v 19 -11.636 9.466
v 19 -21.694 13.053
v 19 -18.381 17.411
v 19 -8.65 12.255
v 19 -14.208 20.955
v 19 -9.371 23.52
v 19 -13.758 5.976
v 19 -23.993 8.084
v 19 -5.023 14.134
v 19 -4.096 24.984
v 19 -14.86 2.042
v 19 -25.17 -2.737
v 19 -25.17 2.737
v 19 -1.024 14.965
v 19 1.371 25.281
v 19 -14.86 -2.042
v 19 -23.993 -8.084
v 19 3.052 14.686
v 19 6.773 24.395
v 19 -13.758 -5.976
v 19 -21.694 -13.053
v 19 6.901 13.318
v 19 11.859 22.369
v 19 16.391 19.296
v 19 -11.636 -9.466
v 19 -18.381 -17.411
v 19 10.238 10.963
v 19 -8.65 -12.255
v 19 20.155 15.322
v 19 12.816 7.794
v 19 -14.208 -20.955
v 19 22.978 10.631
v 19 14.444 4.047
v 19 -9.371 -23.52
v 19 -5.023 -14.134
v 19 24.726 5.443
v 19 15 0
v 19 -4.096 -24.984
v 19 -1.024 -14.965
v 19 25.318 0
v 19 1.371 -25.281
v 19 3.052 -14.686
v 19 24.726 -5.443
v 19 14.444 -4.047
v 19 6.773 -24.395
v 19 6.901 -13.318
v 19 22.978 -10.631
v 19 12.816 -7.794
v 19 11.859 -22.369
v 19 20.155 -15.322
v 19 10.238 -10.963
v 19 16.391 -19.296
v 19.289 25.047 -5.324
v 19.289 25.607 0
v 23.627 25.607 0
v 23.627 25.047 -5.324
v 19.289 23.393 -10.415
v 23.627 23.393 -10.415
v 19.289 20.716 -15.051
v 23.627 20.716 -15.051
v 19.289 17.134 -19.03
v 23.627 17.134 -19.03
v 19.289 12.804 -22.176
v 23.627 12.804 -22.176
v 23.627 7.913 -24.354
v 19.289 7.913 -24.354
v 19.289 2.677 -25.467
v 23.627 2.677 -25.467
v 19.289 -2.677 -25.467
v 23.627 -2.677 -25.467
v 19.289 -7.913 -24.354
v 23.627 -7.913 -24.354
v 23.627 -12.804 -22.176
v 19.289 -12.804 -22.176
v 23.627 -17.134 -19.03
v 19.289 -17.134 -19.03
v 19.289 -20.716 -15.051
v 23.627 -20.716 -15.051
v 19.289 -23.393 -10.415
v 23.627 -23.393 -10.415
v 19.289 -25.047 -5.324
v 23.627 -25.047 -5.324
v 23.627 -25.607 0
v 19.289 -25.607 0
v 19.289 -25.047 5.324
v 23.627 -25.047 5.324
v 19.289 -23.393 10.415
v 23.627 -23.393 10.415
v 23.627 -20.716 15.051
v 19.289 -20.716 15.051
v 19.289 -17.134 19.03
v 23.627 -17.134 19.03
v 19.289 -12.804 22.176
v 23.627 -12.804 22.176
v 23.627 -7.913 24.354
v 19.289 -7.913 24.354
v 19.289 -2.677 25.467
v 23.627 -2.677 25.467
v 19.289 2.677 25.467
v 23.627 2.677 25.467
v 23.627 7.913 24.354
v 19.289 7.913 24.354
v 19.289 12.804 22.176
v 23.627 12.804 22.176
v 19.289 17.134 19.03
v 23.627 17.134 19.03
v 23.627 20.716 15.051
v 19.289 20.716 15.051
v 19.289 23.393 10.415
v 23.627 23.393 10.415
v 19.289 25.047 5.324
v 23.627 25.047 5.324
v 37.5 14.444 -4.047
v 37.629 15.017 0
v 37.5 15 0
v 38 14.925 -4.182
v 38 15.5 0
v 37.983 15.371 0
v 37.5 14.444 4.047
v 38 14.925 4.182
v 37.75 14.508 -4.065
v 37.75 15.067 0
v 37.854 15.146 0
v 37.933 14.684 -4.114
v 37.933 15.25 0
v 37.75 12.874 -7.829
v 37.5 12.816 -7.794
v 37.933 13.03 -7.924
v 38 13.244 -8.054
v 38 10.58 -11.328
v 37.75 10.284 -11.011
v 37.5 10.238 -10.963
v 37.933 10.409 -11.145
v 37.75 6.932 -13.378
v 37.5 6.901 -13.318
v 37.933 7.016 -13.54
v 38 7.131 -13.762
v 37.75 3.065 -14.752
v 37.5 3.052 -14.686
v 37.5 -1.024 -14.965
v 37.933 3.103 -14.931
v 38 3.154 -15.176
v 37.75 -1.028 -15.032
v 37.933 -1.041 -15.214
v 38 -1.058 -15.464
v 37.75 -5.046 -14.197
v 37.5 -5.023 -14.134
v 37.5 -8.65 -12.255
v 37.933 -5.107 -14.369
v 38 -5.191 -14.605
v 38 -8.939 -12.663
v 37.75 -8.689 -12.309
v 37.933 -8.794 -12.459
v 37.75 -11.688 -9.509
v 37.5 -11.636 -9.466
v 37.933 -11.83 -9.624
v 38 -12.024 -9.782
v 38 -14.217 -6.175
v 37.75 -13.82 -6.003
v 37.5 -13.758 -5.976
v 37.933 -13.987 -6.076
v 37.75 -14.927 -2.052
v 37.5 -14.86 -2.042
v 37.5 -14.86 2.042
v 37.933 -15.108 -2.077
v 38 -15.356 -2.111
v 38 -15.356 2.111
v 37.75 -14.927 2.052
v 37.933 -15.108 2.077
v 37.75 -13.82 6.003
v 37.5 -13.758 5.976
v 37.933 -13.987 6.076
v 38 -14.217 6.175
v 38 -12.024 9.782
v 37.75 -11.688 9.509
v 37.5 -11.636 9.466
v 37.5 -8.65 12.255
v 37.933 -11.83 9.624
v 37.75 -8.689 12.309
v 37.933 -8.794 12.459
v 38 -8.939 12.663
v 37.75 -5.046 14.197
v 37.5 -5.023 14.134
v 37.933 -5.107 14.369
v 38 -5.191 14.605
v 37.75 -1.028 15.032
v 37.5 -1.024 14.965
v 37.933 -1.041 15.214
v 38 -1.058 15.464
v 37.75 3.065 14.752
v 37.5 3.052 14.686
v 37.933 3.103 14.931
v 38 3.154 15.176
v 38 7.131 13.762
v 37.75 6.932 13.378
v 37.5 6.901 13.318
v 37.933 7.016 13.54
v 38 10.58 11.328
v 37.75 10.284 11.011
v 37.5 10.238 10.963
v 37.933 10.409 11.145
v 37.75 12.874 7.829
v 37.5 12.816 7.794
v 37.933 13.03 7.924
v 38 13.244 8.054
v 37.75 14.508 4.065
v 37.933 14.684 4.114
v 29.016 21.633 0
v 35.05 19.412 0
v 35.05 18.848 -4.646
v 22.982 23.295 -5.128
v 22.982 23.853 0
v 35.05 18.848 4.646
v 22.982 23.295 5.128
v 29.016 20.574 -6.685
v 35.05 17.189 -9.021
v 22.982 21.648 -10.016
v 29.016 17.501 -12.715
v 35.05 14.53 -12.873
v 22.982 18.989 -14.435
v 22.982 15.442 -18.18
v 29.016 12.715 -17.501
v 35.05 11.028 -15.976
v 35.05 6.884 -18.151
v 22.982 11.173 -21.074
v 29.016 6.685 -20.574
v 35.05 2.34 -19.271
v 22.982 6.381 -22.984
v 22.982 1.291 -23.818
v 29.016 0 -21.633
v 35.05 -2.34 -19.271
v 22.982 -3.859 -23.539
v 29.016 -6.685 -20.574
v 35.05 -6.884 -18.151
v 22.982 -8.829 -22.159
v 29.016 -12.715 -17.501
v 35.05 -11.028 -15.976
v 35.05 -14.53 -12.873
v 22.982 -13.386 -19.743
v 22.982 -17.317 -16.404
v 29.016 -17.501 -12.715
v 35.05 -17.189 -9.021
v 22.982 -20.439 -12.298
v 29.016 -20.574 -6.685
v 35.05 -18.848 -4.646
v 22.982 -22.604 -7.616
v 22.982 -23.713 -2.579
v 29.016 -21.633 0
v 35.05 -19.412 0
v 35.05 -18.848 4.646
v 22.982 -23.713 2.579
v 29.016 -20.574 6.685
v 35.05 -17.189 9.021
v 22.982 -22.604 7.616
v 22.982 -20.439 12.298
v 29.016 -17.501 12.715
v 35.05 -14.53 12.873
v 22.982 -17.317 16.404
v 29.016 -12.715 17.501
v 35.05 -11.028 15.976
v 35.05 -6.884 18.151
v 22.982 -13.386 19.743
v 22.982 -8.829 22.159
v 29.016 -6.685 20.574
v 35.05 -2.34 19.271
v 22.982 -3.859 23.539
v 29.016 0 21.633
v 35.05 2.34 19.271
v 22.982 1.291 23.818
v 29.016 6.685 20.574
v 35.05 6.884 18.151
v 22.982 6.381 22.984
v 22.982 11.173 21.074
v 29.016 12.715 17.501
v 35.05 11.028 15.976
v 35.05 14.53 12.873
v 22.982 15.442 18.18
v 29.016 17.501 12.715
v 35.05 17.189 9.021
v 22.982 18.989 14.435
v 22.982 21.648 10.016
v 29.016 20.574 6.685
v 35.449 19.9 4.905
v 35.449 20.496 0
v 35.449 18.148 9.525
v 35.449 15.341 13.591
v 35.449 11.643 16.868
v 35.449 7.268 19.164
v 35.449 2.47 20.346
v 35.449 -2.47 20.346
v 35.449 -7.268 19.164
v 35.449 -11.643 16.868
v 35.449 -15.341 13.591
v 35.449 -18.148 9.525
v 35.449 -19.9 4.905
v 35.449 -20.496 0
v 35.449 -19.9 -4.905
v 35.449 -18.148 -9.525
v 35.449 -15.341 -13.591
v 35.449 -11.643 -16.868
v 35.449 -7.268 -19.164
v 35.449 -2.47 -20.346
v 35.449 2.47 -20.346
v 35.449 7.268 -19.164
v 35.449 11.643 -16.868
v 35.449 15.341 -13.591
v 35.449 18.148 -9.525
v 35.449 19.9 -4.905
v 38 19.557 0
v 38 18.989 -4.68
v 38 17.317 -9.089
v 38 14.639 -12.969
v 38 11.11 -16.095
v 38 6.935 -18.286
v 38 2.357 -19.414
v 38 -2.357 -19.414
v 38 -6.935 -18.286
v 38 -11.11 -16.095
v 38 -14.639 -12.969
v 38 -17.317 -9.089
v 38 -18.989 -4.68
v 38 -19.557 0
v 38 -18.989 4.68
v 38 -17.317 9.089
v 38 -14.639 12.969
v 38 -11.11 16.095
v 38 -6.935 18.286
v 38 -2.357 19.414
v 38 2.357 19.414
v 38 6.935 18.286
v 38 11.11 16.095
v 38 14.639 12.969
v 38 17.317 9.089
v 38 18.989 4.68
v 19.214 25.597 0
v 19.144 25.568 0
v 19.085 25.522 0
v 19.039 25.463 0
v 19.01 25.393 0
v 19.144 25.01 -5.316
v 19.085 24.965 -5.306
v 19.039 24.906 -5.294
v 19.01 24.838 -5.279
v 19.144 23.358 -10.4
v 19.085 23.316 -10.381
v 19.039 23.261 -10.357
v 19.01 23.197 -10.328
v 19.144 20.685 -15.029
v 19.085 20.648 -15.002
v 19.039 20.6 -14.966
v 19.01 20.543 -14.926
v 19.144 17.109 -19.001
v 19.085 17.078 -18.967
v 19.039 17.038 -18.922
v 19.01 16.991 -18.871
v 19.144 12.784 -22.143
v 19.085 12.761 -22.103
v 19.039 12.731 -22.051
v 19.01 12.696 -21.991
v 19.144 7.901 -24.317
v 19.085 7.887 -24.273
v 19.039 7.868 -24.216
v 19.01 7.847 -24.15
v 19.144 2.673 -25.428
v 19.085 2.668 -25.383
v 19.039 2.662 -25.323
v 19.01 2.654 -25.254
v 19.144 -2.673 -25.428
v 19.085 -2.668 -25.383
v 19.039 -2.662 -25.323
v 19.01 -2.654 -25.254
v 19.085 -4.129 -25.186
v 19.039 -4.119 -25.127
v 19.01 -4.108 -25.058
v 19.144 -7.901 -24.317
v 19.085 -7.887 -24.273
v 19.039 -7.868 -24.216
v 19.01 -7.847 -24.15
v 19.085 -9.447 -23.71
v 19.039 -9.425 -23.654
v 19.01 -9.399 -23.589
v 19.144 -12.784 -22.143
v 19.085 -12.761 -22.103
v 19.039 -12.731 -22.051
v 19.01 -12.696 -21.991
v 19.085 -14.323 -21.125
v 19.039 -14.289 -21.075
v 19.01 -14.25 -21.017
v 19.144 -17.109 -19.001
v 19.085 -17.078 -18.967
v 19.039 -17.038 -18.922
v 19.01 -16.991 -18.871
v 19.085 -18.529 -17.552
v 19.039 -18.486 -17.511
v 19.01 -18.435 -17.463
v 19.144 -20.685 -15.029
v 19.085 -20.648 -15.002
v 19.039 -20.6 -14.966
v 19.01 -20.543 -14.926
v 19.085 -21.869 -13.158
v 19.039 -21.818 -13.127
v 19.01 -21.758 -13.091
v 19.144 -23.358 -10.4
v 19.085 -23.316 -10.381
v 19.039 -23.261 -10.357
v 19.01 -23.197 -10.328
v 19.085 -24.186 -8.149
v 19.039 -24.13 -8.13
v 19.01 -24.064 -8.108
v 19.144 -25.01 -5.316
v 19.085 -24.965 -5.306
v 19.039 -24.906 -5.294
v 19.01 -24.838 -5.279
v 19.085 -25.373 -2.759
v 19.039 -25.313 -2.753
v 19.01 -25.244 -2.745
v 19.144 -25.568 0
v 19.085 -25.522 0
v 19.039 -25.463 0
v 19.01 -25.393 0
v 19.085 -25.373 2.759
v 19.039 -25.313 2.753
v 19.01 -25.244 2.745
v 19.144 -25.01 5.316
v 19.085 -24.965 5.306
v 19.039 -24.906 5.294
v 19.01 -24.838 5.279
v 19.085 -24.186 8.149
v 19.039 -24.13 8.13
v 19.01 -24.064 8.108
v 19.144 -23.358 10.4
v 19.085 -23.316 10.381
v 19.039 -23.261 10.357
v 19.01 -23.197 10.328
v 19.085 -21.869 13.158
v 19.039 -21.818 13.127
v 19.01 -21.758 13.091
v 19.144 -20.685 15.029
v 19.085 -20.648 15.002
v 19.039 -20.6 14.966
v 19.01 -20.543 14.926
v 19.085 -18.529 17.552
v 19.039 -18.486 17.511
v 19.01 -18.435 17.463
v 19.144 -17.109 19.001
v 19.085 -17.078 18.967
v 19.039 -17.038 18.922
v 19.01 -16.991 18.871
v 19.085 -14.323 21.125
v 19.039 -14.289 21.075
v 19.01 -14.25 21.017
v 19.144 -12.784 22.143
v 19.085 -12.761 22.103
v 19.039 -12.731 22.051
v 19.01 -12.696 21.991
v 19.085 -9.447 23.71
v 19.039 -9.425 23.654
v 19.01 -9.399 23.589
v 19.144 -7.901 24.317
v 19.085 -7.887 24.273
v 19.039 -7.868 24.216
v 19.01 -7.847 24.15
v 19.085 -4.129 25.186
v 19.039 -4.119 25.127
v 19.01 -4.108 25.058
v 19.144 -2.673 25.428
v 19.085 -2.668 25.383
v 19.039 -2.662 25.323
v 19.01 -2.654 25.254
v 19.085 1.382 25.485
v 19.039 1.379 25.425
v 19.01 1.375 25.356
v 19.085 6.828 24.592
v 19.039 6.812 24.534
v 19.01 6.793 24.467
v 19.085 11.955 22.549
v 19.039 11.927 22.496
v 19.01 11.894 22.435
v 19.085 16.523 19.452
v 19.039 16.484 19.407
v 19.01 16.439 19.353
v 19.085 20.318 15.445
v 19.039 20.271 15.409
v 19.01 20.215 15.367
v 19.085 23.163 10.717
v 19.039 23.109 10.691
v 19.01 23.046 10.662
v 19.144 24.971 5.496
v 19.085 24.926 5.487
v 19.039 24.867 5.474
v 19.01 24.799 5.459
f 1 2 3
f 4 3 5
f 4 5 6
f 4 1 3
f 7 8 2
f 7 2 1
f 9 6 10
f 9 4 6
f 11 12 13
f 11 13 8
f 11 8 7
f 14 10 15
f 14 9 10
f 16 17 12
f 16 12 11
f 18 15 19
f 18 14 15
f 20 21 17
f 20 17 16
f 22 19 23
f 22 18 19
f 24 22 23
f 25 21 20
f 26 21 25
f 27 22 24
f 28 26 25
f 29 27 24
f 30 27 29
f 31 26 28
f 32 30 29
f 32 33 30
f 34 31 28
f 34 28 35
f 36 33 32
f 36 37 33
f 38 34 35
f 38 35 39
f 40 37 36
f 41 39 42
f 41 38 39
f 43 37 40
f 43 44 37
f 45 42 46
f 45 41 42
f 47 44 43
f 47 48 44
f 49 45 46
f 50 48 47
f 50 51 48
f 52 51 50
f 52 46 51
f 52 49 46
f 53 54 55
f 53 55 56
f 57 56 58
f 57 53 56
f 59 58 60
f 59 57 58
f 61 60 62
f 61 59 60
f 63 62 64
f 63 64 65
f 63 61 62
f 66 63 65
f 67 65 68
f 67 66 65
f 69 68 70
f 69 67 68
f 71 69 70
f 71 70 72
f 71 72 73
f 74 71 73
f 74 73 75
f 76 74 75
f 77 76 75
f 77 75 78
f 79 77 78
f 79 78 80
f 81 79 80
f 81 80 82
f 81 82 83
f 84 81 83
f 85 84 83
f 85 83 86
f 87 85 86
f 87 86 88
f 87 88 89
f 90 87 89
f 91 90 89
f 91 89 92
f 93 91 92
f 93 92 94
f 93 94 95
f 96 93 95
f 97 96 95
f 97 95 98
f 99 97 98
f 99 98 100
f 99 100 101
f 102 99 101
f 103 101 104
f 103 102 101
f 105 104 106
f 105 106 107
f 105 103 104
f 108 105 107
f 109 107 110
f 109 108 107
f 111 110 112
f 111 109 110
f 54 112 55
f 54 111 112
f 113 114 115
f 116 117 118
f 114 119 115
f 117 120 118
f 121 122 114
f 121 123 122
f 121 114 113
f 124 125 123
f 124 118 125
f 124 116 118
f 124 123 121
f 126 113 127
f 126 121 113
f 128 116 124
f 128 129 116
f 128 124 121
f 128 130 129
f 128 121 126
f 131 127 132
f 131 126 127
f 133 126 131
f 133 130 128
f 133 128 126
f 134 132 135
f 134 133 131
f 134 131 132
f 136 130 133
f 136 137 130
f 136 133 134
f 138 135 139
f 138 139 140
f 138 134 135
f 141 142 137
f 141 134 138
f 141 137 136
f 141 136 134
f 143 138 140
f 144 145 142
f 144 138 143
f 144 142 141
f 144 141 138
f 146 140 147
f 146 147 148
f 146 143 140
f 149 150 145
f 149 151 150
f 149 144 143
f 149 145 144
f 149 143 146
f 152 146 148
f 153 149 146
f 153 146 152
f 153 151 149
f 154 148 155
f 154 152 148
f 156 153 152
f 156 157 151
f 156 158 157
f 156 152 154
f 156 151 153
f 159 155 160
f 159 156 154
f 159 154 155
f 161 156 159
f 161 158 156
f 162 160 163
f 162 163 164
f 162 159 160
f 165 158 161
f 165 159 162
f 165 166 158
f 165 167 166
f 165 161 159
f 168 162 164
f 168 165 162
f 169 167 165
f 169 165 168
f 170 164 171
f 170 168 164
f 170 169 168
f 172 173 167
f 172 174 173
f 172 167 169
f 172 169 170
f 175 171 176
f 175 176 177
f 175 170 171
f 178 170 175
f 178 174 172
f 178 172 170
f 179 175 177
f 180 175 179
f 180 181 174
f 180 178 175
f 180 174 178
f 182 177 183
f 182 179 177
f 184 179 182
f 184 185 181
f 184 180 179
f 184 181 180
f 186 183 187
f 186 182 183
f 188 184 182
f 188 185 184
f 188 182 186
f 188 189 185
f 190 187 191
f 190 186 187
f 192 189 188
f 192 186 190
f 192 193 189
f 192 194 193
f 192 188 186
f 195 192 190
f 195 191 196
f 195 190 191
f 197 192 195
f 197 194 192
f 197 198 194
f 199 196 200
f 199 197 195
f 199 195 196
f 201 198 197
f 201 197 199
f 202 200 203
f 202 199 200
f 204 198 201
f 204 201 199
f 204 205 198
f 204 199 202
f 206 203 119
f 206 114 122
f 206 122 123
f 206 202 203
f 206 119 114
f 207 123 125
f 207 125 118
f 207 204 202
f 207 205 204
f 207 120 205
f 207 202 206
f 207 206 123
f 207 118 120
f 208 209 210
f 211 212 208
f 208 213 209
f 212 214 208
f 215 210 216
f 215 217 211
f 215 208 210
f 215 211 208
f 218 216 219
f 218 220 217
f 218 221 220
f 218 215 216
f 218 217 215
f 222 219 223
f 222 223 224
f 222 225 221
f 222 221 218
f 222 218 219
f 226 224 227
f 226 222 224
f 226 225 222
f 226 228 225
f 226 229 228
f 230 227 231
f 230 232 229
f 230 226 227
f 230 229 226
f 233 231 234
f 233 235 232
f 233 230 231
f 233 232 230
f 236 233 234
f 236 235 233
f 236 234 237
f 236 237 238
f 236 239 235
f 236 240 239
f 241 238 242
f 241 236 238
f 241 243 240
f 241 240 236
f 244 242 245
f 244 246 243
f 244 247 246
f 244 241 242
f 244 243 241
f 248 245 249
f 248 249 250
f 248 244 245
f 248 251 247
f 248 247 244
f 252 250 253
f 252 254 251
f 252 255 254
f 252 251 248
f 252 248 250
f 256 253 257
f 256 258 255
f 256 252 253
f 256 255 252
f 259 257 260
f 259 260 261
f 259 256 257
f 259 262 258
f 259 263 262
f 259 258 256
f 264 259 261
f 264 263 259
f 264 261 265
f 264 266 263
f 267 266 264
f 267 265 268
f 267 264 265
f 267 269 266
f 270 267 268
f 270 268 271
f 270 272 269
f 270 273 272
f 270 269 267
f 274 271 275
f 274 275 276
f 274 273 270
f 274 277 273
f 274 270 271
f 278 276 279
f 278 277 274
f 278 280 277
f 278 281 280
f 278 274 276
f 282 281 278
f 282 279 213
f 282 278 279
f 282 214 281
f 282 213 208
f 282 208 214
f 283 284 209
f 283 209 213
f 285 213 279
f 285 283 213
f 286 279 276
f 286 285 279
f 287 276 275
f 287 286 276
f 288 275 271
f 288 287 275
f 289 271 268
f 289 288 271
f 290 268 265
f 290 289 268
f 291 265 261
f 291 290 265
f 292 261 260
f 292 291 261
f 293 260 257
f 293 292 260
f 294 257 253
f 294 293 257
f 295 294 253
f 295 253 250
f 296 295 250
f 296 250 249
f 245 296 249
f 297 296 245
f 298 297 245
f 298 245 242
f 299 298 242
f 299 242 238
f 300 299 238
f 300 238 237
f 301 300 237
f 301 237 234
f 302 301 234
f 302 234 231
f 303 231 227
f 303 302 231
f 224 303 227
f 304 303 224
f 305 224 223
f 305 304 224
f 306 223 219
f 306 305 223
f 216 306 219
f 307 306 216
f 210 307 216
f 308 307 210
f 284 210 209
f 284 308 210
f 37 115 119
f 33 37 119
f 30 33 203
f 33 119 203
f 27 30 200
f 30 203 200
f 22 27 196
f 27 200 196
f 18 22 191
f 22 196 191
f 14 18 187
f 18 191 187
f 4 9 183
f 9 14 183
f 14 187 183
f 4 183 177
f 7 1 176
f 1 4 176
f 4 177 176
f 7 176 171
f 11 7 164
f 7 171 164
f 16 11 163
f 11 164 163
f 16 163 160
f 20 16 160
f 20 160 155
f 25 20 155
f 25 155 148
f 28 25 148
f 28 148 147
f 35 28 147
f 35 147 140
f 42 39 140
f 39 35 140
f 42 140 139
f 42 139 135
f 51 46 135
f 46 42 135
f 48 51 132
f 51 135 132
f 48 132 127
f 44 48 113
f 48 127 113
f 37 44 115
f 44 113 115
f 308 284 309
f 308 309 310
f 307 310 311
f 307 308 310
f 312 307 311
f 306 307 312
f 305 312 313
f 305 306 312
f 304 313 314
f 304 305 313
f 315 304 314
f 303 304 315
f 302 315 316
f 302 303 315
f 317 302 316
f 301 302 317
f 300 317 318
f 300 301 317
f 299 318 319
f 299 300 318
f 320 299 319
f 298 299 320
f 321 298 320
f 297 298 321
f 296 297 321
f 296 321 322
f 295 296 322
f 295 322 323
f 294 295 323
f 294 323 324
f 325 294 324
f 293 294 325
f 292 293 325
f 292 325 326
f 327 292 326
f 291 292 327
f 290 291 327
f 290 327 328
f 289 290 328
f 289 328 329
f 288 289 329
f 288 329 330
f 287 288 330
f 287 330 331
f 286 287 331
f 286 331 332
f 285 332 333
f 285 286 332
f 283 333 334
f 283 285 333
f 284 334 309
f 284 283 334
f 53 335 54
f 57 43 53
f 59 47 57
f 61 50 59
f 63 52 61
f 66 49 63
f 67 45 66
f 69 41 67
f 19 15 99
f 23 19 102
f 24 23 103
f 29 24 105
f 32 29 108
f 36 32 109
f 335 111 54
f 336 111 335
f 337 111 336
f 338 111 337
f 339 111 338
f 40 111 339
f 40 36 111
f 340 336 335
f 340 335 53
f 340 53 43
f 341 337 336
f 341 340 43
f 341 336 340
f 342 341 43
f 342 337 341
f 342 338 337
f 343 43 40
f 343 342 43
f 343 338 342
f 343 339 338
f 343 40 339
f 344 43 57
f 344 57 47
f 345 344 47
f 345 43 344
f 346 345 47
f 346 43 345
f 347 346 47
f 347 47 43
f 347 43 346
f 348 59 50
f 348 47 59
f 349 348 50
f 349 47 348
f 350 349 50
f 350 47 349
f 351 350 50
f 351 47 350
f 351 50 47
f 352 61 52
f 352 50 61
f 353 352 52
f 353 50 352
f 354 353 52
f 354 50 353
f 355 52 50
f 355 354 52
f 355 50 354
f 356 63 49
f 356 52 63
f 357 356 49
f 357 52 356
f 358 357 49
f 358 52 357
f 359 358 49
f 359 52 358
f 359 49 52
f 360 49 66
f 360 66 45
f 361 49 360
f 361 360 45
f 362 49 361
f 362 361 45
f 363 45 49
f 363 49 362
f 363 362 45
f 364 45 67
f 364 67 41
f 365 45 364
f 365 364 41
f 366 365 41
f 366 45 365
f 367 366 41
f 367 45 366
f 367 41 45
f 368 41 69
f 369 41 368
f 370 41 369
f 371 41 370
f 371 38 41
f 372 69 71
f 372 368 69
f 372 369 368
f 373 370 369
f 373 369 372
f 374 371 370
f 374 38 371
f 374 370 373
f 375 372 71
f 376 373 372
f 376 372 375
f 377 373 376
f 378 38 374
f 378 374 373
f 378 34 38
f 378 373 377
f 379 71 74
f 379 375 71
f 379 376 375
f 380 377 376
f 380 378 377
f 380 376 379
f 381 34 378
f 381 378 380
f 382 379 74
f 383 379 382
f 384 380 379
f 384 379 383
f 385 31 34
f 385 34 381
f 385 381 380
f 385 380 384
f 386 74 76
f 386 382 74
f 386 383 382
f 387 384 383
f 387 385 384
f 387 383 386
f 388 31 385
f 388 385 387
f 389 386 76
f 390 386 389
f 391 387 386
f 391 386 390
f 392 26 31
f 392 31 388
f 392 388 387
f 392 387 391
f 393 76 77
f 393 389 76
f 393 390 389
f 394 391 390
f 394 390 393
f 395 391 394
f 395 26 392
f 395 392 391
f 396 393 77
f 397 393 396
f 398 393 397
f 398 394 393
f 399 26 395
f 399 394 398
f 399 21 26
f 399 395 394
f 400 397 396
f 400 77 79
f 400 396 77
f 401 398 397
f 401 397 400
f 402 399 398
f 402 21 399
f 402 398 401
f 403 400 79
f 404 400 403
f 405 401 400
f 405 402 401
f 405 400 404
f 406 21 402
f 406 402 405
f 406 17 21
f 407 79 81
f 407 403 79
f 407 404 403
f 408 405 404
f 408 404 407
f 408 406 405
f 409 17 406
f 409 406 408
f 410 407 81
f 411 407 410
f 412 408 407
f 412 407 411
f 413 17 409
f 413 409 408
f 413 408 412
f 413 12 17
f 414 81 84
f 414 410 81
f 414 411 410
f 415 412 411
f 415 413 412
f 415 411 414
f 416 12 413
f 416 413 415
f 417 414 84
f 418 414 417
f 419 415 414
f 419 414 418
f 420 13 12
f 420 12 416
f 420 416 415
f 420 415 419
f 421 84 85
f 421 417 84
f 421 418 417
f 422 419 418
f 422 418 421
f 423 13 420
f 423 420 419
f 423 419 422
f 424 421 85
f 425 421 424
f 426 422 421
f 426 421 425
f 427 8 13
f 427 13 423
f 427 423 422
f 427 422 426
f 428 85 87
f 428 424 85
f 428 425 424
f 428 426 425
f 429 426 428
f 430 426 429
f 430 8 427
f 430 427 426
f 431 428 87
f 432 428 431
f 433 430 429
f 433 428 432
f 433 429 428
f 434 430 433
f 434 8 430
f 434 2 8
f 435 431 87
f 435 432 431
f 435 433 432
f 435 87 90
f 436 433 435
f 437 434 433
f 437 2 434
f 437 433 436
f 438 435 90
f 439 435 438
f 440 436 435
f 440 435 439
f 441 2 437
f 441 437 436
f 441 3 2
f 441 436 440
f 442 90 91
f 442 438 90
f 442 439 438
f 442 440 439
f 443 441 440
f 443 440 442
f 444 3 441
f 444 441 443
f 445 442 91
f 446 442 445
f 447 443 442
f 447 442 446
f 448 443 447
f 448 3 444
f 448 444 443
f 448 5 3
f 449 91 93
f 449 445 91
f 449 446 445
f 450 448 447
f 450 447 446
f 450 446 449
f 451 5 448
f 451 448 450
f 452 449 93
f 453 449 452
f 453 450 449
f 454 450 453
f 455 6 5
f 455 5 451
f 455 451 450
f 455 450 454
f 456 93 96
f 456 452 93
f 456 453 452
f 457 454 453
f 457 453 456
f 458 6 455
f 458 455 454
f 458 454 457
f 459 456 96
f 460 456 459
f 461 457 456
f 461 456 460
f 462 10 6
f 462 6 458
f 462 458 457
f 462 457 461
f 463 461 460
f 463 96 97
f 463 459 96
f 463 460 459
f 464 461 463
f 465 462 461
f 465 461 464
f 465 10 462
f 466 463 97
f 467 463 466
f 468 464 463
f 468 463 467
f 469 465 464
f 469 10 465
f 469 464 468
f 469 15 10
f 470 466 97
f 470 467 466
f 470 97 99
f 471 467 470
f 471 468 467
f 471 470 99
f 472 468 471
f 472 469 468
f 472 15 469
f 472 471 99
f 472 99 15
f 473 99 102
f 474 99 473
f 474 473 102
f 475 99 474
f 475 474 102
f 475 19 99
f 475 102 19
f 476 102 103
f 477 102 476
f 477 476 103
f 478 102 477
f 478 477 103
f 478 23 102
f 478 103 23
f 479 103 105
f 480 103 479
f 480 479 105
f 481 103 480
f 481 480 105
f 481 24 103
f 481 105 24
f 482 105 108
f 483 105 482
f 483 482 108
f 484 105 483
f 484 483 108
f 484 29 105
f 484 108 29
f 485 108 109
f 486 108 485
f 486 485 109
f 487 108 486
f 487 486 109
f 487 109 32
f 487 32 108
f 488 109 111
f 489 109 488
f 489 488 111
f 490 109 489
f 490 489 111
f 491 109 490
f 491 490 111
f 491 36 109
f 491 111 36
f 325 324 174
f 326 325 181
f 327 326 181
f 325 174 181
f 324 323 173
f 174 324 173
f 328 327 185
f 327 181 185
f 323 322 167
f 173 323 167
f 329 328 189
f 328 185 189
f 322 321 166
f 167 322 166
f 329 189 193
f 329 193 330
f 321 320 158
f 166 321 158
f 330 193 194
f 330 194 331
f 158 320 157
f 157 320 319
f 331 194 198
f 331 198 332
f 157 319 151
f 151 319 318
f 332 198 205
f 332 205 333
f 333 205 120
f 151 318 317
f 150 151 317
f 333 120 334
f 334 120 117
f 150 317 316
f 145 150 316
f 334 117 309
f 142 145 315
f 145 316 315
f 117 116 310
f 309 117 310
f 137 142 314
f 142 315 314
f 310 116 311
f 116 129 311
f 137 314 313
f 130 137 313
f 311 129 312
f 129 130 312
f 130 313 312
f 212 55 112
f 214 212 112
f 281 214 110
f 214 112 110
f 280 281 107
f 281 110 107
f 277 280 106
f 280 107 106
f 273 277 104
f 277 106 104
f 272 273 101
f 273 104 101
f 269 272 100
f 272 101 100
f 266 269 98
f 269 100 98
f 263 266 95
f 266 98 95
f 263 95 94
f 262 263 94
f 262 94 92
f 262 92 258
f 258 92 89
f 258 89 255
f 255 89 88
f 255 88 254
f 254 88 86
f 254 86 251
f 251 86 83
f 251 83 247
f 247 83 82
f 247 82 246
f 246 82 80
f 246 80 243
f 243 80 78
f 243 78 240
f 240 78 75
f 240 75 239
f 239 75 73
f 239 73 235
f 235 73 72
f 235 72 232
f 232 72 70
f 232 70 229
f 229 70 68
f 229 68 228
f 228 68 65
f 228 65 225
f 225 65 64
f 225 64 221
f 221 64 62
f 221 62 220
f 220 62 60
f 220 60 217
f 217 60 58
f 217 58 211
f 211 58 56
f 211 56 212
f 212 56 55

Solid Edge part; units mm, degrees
sketch "Sketch1" plane through (0, 0, 0) normal (0, 0, 1) x (1, 0, 0)
  line L0 (19, 25.318) -> (19, 15)
  line L1 (19, 15) -> (37.5, 15)
  arc A0 (37.5, 15) -> (38, 15.5) centre (37.5, 15.5) ccw
  line L2 (38, 15.5) -> (38, 19.557)
  line L3 (38, 19.557) -> (35.4486, 20.4958)
  line L4 (35.4486, 20.4958) -> (35.05, 19.4124)
  line L5 (35.05, 19.4124) -> (22.9816, 23.853)
  line L6 (22.9816, 23.853) -> (23.627, 25.607)
  line L7 (23.627, 25.607) -> (19.289, 25.607)
  arc A1 (19.289, 25.607) -> (19, 25.318) centre (19.289, 25.318) ccw
revolve "RevolvedProtrusion1" add sketch "Sketch1" angle 360 about axis through (50, 0, 0) along (-1, 0, 0)
